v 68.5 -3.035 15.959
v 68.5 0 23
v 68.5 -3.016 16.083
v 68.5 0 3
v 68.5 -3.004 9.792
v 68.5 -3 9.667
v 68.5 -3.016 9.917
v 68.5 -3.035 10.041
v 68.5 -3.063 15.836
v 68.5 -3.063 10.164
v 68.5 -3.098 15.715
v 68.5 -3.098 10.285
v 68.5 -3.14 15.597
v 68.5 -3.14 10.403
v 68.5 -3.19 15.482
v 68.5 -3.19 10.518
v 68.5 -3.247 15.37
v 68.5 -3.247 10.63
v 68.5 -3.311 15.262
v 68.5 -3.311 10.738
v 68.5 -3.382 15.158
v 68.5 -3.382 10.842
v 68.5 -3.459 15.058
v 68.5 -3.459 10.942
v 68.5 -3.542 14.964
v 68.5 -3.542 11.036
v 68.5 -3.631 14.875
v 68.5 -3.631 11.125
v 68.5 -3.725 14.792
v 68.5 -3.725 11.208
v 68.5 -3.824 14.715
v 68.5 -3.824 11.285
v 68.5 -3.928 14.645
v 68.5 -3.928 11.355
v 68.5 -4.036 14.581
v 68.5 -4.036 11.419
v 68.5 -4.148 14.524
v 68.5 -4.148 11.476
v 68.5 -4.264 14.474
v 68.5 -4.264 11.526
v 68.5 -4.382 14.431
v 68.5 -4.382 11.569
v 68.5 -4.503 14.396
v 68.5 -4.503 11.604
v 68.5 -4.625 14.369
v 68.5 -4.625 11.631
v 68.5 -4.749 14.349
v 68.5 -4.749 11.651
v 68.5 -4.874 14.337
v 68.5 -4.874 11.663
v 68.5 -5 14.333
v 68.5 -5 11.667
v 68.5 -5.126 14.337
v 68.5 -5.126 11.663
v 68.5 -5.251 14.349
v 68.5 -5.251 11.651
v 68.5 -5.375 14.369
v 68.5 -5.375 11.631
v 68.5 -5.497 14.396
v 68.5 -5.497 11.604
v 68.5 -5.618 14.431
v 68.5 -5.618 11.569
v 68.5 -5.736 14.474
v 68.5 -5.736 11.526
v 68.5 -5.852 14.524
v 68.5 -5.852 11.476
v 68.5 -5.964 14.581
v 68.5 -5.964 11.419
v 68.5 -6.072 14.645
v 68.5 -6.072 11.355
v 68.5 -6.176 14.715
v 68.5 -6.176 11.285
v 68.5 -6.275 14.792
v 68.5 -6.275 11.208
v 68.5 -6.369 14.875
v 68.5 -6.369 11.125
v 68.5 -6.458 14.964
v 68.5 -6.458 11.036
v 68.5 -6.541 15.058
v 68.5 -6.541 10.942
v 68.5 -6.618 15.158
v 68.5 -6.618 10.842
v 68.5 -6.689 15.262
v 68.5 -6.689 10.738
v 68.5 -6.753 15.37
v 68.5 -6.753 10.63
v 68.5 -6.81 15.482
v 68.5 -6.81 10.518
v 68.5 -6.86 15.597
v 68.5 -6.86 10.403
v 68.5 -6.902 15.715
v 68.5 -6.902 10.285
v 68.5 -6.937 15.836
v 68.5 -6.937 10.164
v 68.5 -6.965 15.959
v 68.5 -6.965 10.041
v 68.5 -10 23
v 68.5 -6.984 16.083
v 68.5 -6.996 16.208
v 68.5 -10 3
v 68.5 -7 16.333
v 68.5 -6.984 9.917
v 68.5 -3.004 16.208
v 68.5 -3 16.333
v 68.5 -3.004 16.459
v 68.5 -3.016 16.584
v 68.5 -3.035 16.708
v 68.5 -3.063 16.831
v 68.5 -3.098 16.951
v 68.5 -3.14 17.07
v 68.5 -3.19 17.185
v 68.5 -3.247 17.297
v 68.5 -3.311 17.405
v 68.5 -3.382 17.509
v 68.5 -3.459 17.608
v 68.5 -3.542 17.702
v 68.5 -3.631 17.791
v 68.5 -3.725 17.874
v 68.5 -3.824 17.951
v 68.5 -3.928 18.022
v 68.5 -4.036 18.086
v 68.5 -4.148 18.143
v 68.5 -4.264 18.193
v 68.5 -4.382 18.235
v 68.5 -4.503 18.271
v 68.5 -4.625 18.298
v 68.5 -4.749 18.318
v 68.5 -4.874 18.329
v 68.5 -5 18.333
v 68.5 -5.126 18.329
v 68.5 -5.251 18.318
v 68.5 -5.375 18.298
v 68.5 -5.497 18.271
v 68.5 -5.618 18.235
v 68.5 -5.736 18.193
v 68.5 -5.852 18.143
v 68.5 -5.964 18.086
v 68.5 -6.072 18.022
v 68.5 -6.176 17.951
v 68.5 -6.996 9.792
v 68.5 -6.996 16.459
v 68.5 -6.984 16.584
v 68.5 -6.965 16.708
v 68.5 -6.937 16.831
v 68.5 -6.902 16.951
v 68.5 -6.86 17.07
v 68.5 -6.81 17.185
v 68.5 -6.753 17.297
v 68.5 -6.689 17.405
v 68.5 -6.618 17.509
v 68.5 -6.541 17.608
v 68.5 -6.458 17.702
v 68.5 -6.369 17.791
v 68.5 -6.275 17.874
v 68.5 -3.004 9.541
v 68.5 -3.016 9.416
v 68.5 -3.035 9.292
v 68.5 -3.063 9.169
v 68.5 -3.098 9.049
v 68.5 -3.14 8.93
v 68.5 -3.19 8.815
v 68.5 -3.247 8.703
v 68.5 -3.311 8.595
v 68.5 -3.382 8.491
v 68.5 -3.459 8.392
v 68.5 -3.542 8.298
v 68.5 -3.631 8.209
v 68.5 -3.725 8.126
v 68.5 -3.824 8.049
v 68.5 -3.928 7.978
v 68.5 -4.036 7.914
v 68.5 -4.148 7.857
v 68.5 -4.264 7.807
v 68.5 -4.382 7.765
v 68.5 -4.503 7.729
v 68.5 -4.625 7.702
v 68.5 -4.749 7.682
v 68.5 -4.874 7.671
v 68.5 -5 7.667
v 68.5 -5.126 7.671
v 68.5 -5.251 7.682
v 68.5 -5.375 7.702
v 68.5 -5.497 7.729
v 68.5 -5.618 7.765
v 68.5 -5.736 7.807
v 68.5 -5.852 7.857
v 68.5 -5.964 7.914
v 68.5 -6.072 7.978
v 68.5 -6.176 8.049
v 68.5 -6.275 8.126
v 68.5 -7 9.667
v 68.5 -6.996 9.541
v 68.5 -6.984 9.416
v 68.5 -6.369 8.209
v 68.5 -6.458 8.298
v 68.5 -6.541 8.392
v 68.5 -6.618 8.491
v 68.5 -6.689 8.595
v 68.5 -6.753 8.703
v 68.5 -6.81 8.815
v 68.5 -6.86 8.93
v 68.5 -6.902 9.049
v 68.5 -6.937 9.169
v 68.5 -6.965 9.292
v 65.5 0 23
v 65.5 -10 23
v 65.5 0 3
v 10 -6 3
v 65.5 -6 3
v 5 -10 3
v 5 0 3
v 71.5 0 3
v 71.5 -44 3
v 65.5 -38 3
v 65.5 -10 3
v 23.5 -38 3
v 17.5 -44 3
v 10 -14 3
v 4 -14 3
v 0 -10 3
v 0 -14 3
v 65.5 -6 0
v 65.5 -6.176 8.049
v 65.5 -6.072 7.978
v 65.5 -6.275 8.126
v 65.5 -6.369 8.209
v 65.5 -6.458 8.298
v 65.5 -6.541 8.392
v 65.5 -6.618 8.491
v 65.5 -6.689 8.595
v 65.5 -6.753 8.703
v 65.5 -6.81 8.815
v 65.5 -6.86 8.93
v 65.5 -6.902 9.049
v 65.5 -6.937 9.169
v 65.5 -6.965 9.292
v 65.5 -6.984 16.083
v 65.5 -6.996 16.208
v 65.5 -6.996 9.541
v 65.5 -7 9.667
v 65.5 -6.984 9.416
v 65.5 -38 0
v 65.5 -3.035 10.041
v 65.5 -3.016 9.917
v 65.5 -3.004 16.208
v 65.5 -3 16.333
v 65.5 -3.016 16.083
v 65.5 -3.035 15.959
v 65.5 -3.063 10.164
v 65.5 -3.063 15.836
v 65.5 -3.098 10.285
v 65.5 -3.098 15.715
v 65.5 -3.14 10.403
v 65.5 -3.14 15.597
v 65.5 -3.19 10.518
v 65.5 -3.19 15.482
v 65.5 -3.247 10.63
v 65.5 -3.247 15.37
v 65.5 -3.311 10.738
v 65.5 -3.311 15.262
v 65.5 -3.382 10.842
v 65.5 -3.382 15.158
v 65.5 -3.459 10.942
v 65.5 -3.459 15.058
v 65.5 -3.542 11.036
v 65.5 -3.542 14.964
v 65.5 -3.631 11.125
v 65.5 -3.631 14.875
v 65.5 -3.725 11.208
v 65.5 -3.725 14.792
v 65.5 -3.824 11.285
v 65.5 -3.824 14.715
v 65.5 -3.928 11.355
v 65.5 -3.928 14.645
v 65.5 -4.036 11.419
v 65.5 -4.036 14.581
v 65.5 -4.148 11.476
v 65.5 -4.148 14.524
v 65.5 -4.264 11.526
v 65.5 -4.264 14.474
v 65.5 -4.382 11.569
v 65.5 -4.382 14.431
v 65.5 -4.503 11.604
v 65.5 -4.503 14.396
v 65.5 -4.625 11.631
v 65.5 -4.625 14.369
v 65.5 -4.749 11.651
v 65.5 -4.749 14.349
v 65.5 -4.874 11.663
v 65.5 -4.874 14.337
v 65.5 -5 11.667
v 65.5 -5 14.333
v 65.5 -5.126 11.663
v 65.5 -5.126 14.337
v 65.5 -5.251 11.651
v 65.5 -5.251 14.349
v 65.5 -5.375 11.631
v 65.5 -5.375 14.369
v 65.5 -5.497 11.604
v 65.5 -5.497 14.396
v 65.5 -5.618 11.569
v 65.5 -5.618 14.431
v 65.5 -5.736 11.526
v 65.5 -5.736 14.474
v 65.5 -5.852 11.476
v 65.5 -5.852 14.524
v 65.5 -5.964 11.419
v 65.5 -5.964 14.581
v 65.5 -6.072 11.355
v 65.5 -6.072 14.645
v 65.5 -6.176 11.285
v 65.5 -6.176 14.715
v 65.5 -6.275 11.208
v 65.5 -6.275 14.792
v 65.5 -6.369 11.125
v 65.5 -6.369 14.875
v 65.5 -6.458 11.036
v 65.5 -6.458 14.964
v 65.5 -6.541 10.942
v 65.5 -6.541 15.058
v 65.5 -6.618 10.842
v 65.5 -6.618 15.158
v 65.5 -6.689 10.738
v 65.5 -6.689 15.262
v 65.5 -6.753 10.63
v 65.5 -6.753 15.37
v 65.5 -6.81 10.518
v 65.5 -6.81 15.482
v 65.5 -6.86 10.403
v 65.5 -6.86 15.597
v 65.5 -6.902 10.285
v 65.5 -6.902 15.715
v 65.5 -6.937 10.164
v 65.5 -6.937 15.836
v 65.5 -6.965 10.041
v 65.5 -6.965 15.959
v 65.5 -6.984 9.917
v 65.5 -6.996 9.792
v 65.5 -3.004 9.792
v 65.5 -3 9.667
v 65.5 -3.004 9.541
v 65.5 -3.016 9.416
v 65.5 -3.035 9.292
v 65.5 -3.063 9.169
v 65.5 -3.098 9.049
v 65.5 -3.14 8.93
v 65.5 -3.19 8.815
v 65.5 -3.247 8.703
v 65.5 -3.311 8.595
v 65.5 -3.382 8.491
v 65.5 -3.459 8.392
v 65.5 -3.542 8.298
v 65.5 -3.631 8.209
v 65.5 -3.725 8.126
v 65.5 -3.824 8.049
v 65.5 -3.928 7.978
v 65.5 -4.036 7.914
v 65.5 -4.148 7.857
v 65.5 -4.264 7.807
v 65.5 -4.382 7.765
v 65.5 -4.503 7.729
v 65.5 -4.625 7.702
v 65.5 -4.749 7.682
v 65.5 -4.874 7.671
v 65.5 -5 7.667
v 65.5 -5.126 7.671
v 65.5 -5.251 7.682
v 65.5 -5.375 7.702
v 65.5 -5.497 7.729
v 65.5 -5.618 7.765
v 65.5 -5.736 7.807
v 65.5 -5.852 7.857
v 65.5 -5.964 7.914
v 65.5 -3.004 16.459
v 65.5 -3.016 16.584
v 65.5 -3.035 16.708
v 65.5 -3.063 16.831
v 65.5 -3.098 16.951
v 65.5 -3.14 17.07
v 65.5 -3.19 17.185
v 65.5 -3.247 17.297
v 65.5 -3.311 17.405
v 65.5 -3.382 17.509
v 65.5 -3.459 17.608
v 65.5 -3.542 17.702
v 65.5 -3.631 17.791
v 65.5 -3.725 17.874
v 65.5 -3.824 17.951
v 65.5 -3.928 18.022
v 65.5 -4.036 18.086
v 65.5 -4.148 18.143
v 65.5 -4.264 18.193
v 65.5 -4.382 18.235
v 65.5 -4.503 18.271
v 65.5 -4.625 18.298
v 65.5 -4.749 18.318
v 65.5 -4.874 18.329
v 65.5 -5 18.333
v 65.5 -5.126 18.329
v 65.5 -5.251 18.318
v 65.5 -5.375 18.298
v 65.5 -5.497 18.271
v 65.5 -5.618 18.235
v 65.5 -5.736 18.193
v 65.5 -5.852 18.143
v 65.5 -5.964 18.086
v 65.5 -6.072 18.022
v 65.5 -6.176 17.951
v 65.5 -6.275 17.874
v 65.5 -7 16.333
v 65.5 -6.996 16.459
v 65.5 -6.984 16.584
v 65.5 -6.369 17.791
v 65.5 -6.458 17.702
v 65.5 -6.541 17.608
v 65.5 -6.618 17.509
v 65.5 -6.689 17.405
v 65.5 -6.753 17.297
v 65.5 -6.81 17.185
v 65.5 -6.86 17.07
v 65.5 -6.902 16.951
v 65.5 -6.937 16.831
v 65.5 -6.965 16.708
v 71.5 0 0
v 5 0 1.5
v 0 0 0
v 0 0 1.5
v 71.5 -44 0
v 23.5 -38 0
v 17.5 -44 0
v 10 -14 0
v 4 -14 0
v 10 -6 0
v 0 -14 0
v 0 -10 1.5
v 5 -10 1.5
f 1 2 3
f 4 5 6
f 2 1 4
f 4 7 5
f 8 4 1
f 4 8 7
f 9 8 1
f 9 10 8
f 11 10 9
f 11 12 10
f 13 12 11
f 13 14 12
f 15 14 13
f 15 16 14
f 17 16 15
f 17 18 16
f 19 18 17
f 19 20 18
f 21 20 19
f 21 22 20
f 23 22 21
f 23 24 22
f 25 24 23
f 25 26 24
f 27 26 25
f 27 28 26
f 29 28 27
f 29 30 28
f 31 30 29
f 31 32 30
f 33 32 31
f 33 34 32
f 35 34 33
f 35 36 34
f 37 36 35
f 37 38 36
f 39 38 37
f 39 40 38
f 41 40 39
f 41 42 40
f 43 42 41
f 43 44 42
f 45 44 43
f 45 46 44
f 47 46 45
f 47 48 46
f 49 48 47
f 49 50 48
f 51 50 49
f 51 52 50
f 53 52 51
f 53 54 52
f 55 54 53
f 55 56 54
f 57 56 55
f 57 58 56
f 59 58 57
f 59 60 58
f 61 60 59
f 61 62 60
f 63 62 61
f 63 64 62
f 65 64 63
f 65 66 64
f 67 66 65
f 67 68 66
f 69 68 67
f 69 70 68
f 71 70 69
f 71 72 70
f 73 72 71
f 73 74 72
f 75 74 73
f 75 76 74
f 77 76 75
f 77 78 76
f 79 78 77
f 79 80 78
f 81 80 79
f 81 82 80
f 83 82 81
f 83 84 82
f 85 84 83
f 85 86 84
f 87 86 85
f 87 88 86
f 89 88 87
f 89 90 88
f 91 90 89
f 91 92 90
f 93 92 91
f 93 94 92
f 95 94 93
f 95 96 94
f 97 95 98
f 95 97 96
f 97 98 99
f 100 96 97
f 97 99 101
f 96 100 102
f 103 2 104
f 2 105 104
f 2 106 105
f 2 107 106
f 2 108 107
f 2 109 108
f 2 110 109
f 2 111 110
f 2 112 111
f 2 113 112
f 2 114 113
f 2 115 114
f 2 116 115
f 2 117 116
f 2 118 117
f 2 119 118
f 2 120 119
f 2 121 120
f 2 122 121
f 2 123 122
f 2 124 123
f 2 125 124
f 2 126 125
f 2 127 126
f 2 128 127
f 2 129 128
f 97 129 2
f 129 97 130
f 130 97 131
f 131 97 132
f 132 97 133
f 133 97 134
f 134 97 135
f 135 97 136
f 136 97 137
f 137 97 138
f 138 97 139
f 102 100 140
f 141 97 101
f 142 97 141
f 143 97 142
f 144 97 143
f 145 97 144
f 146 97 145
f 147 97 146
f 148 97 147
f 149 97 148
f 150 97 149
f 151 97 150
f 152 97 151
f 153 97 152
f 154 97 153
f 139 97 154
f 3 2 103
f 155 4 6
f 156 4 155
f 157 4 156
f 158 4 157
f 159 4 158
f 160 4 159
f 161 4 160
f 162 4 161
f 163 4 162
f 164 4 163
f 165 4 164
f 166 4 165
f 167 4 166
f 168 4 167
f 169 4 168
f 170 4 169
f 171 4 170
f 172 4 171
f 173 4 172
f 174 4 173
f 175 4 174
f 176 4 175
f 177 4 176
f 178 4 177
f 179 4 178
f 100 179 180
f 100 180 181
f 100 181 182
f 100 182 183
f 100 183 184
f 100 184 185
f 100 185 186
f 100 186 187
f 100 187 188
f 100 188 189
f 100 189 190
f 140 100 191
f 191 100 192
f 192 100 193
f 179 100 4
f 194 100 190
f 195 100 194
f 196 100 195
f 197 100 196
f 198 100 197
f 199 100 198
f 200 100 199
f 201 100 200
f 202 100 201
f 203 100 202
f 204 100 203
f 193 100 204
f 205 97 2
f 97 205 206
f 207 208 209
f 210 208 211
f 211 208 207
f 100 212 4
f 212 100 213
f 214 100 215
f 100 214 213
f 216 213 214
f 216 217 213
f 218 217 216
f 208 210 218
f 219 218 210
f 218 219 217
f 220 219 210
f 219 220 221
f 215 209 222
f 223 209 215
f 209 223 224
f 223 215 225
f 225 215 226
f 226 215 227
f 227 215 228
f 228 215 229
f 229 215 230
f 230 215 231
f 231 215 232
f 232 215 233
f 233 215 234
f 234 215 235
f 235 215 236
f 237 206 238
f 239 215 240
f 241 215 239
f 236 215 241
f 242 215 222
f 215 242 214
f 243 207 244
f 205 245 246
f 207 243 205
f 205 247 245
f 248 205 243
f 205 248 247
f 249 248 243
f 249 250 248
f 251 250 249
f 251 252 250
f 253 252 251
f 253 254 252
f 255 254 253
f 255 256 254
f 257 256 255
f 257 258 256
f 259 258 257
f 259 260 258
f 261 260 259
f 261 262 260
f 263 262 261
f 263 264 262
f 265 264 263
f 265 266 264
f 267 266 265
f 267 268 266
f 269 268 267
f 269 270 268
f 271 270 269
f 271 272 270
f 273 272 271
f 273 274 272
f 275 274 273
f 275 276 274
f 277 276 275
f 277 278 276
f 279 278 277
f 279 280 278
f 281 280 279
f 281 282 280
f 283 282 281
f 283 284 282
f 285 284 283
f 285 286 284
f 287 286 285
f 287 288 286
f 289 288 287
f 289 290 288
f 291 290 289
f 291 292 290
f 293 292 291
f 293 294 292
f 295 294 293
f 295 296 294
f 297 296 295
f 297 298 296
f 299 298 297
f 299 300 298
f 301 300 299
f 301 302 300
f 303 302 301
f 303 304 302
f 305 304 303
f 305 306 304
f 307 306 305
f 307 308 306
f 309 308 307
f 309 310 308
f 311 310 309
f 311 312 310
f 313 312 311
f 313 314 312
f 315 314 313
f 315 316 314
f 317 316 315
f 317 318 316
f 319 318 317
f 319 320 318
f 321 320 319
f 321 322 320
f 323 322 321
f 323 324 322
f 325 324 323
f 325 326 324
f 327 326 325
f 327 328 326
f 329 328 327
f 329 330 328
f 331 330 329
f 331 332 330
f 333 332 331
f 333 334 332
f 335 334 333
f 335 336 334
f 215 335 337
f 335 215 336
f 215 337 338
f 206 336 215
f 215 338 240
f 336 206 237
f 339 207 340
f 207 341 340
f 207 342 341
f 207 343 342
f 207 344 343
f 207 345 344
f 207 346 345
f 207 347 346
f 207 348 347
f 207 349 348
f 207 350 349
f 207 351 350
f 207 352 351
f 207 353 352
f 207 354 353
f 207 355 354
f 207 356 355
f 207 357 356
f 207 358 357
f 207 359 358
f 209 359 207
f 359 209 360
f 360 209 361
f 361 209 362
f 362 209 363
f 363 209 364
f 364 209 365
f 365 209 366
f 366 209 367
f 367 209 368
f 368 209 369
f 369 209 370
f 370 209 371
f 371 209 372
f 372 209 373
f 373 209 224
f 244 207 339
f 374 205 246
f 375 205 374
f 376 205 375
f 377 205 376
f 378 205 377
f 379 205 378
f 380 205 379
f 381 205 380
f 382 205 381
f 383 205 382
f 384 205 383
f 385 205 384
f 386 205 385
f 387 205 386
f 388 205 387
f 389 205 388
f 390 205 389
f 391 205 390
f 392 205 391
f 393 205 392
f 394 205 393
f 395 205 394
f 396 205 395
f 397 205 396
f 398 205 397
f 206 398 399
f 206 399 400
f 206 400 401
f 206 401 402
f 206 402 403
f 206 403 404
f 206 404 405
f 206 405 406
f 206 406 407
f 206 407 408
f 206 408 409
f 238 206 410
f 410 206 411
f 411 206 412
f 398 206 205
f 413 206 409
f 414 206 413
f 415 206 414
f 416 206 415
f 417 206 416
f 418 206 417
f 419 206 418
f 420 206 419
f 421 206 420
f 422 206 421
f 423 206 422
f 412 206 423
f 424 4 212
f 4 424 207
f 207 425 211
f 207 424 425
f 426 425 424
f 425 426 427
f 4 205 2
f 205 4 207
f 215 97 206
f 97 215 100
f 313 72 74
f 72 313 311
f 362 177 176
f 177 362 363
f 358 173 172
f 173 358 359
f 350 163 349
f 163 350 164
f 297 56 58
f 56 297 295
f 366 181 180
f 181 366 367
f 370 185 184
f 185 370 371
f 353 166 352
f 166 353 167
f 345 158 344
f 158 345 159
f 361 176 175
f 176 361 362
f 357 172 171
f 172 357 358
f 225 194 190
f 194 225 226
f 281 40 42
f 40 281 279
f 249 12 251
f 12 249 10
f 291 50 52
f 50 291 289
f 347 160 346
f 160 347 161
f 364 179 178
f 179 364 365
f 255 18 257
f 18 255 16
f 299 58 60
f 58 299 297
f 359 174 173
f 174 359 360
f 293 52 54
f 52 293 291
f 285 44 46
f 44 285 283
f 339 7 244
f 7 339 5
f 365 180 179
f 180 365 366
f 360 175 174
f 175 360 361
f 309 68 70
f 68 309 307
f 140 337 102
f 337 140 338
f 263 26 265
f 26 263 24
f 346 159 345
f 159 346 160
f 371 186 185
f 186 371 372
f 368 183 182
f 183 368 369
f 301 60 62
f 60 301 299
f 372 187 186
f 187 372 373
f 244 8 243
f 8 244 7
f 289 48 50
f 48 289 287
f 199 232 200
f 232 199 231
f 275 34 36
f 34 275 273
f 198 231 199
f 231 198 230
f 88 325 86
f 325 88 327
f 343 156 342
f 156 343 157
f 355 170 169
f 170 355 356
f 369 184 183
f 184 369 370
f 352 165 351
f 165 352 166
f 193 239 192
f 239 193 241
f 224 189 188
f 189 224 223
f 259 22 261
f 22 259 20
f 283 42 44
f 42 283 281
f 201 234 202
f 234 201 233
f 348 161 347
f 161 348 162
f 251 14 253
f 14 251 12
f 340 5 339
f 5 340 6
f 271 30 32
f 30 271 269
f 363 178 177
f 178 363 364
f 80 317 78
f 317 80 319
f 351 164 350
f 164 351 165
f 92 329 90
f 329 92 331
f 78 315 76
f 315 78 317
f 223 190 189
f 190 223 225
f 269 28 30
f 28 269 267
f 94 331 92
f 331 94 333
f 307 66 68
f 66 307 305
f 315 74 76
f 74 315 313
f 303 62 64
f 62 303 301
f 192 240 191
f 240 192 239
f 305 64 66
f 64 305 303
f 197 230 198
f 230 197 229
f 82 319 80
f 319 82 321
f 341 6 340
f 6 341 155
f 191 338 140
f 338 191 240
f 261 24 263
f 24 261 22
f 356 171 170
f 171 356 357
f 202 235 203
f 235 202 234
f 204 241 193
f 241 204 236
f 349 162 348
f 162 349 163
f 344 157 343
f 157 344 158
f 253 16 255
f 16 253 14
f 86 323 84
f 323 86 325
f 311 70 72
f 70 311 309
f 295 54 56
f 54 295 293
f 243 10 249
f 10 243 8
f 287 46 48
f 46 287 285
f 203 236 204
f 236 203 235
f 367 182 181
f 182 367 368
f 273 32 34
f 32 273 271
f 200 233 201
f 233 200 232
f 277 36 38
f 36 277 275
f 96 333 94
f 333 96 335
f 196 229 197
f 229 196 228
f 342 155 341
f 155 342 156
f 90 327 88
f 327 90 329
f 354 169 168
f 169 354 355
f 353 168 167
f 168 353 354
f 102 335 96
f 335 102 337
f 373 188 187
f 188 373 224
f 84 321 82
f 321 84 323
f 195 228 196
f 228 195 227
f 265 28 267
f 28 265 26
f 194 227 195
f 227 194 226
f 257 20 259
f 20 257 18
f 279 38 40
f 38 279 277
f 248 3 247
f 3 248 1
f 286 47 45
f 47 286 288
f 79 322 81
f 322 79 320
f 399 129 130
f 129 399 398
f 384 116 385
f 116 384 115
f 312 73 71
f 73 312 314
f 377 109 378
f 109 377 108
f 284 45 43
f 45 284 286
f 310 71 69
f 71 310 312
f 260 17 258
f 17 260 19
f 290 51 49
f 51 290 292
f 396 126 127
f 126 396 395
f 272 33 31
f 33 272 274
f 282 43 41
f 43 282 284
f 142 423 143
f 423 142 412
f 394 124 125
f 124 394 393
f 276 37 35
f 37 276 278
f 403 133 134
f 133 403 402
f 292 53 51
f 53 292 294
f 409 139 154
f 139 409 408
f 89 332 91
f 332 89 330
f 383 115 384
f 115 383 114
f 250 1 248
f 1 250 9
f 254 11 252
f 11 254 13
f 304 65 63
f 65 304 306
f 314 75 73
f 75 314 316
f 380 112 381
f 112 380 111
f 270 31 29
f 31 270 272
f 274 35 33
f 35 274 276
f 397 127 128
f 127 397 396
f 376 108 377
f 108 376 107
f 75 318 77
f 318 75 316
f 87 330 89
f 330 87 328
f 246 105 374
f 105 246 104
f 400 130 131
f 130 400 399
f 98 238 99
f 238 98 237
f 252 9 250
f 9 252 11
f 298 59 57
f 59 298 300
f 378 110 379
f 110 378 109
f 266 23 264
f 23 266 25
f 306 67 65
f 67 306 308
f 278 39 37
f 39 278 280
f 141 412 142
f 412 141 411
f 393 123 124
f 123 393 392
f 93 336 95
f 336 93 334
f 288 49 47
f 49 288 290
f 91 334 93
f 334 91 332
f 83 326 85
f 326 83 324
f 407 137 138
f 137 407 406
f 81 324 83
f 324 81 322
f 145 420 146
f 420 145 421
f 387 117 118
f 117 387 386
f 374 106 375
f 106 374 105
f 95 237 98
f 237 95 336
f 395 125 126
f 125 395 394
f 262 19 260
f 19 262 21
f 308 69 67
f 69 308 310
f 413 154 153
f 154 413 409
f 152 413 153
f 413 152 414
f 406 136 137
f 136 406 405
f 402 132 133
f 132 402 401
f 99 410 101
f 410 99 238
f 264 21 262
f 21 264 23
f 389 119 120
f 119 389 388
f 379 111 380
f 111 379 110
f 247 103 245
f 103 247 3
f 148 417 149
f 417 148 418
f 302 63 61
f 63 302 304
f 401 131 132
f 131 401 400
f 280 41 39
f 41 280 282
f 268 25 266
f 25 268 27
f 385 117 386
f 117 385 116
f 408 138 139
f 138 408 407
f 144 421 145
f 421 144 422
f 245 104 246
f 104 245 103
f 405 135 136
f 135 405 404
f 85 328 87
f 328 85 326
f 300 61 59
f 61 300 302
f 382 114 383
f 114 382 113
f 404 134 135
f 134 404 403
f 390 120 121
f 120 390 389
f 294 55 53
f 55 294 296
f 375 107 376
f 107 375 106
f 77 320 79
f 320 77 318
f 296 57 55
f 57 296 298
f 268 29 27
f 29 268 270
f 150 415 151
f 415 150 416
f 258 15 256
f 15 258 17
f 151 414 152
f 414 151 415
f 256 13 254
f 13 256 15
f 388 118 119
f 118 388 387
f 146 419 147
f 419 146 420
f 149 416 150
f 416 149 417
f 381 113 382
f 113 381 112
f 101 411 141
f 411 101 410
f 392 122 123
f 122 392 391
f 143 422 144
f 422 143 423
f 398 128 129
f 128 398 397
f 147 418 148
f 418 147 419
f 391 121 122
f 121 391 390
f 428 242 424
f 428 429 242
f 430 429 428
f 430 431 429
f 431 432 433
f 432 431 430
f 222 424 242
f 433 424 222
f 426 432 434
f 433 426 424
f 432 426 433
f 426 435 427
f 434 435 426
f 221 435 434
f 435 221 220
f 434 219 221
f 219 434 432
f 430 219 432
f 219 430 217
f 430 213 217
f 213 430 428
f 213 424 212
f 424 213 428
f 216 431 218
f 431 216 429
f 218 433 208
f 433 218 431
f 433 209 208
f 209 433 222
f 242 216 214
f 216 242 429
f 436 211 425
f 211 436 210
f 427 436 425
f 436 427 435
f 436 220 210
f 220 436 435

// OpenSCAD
$fn = 100;

glasses_width=143;
glasses_height = 44;
nose_width_top = 4;
nose_width_bottom = 17.5;
nose_height = 30;
rim_thickness = 6;
rim_depth = 3;

arm_join_depth = 3;
arm_join_height = 20;
arm_join_thickness = 10;

frame_joint_width = 5;
frame_joint_height= 10;

module rim_outline()
{
    outer_points = [  [0,0], 
                [glasses_width/2, 0],
                [glasses_width/2,-glasses_height],
                [nose_width_bottom, -glasses_height],
                [nose_width_top, -glasses_height + nose_height],
                [0, -glasses_height + nose_height]];

    inner_points = [    [nose_width_top + rim_thickness, -rim_thickness],
                        [glasses_width/2 - rim_thickness, -rim_thickness],
                        [glasses_width/2 - rim_thickness, -glasses_height+rim_thickness],
                        [nose_width_bottom + rim_thickness, -glasses_height + rim_thickness],
                        [nose_width_top + rim_thickness, -glasses_height + nose_height]];

    difference()
    {
        polygon(points = outer_points);
        polygon(points = inner_points);
    }
}

module half_frame()
{
    // Draw rim
    linear_extrude(rim_depth)
    {
        rim_outline();
    }

    // Make the arm mount
    // Move to edge
    translate([glasses_width/2 - rim_thickness, -arm_join_thickness, rim_depth])
    {
        //Make two holes in mount
        difference()
        {
            cube([arm_join_depth, arm_join_thickness, arm_join_height]);
            translate([0,arm_join_thickness/2, arm_join_height/3])
            {
                rotate([0,90,0])
                {
                    cylinder(r=2, h=arm_join_depth);
                }
            }
            translate([0,arm_join_thickness/2, arm_join_height*2/3])
            {
                rotate([0,90,0])
                {
                    cylinder(r=2, h=arm_join_depth);
                }
            }
        }
    }
}

difference()
{
    half_frame();
    translate([0,-frame_joint_height,rim_depth/2])
    {
        cube([frame_joint_width,frame_joint_height,rim_depth/2]);
    }
}
